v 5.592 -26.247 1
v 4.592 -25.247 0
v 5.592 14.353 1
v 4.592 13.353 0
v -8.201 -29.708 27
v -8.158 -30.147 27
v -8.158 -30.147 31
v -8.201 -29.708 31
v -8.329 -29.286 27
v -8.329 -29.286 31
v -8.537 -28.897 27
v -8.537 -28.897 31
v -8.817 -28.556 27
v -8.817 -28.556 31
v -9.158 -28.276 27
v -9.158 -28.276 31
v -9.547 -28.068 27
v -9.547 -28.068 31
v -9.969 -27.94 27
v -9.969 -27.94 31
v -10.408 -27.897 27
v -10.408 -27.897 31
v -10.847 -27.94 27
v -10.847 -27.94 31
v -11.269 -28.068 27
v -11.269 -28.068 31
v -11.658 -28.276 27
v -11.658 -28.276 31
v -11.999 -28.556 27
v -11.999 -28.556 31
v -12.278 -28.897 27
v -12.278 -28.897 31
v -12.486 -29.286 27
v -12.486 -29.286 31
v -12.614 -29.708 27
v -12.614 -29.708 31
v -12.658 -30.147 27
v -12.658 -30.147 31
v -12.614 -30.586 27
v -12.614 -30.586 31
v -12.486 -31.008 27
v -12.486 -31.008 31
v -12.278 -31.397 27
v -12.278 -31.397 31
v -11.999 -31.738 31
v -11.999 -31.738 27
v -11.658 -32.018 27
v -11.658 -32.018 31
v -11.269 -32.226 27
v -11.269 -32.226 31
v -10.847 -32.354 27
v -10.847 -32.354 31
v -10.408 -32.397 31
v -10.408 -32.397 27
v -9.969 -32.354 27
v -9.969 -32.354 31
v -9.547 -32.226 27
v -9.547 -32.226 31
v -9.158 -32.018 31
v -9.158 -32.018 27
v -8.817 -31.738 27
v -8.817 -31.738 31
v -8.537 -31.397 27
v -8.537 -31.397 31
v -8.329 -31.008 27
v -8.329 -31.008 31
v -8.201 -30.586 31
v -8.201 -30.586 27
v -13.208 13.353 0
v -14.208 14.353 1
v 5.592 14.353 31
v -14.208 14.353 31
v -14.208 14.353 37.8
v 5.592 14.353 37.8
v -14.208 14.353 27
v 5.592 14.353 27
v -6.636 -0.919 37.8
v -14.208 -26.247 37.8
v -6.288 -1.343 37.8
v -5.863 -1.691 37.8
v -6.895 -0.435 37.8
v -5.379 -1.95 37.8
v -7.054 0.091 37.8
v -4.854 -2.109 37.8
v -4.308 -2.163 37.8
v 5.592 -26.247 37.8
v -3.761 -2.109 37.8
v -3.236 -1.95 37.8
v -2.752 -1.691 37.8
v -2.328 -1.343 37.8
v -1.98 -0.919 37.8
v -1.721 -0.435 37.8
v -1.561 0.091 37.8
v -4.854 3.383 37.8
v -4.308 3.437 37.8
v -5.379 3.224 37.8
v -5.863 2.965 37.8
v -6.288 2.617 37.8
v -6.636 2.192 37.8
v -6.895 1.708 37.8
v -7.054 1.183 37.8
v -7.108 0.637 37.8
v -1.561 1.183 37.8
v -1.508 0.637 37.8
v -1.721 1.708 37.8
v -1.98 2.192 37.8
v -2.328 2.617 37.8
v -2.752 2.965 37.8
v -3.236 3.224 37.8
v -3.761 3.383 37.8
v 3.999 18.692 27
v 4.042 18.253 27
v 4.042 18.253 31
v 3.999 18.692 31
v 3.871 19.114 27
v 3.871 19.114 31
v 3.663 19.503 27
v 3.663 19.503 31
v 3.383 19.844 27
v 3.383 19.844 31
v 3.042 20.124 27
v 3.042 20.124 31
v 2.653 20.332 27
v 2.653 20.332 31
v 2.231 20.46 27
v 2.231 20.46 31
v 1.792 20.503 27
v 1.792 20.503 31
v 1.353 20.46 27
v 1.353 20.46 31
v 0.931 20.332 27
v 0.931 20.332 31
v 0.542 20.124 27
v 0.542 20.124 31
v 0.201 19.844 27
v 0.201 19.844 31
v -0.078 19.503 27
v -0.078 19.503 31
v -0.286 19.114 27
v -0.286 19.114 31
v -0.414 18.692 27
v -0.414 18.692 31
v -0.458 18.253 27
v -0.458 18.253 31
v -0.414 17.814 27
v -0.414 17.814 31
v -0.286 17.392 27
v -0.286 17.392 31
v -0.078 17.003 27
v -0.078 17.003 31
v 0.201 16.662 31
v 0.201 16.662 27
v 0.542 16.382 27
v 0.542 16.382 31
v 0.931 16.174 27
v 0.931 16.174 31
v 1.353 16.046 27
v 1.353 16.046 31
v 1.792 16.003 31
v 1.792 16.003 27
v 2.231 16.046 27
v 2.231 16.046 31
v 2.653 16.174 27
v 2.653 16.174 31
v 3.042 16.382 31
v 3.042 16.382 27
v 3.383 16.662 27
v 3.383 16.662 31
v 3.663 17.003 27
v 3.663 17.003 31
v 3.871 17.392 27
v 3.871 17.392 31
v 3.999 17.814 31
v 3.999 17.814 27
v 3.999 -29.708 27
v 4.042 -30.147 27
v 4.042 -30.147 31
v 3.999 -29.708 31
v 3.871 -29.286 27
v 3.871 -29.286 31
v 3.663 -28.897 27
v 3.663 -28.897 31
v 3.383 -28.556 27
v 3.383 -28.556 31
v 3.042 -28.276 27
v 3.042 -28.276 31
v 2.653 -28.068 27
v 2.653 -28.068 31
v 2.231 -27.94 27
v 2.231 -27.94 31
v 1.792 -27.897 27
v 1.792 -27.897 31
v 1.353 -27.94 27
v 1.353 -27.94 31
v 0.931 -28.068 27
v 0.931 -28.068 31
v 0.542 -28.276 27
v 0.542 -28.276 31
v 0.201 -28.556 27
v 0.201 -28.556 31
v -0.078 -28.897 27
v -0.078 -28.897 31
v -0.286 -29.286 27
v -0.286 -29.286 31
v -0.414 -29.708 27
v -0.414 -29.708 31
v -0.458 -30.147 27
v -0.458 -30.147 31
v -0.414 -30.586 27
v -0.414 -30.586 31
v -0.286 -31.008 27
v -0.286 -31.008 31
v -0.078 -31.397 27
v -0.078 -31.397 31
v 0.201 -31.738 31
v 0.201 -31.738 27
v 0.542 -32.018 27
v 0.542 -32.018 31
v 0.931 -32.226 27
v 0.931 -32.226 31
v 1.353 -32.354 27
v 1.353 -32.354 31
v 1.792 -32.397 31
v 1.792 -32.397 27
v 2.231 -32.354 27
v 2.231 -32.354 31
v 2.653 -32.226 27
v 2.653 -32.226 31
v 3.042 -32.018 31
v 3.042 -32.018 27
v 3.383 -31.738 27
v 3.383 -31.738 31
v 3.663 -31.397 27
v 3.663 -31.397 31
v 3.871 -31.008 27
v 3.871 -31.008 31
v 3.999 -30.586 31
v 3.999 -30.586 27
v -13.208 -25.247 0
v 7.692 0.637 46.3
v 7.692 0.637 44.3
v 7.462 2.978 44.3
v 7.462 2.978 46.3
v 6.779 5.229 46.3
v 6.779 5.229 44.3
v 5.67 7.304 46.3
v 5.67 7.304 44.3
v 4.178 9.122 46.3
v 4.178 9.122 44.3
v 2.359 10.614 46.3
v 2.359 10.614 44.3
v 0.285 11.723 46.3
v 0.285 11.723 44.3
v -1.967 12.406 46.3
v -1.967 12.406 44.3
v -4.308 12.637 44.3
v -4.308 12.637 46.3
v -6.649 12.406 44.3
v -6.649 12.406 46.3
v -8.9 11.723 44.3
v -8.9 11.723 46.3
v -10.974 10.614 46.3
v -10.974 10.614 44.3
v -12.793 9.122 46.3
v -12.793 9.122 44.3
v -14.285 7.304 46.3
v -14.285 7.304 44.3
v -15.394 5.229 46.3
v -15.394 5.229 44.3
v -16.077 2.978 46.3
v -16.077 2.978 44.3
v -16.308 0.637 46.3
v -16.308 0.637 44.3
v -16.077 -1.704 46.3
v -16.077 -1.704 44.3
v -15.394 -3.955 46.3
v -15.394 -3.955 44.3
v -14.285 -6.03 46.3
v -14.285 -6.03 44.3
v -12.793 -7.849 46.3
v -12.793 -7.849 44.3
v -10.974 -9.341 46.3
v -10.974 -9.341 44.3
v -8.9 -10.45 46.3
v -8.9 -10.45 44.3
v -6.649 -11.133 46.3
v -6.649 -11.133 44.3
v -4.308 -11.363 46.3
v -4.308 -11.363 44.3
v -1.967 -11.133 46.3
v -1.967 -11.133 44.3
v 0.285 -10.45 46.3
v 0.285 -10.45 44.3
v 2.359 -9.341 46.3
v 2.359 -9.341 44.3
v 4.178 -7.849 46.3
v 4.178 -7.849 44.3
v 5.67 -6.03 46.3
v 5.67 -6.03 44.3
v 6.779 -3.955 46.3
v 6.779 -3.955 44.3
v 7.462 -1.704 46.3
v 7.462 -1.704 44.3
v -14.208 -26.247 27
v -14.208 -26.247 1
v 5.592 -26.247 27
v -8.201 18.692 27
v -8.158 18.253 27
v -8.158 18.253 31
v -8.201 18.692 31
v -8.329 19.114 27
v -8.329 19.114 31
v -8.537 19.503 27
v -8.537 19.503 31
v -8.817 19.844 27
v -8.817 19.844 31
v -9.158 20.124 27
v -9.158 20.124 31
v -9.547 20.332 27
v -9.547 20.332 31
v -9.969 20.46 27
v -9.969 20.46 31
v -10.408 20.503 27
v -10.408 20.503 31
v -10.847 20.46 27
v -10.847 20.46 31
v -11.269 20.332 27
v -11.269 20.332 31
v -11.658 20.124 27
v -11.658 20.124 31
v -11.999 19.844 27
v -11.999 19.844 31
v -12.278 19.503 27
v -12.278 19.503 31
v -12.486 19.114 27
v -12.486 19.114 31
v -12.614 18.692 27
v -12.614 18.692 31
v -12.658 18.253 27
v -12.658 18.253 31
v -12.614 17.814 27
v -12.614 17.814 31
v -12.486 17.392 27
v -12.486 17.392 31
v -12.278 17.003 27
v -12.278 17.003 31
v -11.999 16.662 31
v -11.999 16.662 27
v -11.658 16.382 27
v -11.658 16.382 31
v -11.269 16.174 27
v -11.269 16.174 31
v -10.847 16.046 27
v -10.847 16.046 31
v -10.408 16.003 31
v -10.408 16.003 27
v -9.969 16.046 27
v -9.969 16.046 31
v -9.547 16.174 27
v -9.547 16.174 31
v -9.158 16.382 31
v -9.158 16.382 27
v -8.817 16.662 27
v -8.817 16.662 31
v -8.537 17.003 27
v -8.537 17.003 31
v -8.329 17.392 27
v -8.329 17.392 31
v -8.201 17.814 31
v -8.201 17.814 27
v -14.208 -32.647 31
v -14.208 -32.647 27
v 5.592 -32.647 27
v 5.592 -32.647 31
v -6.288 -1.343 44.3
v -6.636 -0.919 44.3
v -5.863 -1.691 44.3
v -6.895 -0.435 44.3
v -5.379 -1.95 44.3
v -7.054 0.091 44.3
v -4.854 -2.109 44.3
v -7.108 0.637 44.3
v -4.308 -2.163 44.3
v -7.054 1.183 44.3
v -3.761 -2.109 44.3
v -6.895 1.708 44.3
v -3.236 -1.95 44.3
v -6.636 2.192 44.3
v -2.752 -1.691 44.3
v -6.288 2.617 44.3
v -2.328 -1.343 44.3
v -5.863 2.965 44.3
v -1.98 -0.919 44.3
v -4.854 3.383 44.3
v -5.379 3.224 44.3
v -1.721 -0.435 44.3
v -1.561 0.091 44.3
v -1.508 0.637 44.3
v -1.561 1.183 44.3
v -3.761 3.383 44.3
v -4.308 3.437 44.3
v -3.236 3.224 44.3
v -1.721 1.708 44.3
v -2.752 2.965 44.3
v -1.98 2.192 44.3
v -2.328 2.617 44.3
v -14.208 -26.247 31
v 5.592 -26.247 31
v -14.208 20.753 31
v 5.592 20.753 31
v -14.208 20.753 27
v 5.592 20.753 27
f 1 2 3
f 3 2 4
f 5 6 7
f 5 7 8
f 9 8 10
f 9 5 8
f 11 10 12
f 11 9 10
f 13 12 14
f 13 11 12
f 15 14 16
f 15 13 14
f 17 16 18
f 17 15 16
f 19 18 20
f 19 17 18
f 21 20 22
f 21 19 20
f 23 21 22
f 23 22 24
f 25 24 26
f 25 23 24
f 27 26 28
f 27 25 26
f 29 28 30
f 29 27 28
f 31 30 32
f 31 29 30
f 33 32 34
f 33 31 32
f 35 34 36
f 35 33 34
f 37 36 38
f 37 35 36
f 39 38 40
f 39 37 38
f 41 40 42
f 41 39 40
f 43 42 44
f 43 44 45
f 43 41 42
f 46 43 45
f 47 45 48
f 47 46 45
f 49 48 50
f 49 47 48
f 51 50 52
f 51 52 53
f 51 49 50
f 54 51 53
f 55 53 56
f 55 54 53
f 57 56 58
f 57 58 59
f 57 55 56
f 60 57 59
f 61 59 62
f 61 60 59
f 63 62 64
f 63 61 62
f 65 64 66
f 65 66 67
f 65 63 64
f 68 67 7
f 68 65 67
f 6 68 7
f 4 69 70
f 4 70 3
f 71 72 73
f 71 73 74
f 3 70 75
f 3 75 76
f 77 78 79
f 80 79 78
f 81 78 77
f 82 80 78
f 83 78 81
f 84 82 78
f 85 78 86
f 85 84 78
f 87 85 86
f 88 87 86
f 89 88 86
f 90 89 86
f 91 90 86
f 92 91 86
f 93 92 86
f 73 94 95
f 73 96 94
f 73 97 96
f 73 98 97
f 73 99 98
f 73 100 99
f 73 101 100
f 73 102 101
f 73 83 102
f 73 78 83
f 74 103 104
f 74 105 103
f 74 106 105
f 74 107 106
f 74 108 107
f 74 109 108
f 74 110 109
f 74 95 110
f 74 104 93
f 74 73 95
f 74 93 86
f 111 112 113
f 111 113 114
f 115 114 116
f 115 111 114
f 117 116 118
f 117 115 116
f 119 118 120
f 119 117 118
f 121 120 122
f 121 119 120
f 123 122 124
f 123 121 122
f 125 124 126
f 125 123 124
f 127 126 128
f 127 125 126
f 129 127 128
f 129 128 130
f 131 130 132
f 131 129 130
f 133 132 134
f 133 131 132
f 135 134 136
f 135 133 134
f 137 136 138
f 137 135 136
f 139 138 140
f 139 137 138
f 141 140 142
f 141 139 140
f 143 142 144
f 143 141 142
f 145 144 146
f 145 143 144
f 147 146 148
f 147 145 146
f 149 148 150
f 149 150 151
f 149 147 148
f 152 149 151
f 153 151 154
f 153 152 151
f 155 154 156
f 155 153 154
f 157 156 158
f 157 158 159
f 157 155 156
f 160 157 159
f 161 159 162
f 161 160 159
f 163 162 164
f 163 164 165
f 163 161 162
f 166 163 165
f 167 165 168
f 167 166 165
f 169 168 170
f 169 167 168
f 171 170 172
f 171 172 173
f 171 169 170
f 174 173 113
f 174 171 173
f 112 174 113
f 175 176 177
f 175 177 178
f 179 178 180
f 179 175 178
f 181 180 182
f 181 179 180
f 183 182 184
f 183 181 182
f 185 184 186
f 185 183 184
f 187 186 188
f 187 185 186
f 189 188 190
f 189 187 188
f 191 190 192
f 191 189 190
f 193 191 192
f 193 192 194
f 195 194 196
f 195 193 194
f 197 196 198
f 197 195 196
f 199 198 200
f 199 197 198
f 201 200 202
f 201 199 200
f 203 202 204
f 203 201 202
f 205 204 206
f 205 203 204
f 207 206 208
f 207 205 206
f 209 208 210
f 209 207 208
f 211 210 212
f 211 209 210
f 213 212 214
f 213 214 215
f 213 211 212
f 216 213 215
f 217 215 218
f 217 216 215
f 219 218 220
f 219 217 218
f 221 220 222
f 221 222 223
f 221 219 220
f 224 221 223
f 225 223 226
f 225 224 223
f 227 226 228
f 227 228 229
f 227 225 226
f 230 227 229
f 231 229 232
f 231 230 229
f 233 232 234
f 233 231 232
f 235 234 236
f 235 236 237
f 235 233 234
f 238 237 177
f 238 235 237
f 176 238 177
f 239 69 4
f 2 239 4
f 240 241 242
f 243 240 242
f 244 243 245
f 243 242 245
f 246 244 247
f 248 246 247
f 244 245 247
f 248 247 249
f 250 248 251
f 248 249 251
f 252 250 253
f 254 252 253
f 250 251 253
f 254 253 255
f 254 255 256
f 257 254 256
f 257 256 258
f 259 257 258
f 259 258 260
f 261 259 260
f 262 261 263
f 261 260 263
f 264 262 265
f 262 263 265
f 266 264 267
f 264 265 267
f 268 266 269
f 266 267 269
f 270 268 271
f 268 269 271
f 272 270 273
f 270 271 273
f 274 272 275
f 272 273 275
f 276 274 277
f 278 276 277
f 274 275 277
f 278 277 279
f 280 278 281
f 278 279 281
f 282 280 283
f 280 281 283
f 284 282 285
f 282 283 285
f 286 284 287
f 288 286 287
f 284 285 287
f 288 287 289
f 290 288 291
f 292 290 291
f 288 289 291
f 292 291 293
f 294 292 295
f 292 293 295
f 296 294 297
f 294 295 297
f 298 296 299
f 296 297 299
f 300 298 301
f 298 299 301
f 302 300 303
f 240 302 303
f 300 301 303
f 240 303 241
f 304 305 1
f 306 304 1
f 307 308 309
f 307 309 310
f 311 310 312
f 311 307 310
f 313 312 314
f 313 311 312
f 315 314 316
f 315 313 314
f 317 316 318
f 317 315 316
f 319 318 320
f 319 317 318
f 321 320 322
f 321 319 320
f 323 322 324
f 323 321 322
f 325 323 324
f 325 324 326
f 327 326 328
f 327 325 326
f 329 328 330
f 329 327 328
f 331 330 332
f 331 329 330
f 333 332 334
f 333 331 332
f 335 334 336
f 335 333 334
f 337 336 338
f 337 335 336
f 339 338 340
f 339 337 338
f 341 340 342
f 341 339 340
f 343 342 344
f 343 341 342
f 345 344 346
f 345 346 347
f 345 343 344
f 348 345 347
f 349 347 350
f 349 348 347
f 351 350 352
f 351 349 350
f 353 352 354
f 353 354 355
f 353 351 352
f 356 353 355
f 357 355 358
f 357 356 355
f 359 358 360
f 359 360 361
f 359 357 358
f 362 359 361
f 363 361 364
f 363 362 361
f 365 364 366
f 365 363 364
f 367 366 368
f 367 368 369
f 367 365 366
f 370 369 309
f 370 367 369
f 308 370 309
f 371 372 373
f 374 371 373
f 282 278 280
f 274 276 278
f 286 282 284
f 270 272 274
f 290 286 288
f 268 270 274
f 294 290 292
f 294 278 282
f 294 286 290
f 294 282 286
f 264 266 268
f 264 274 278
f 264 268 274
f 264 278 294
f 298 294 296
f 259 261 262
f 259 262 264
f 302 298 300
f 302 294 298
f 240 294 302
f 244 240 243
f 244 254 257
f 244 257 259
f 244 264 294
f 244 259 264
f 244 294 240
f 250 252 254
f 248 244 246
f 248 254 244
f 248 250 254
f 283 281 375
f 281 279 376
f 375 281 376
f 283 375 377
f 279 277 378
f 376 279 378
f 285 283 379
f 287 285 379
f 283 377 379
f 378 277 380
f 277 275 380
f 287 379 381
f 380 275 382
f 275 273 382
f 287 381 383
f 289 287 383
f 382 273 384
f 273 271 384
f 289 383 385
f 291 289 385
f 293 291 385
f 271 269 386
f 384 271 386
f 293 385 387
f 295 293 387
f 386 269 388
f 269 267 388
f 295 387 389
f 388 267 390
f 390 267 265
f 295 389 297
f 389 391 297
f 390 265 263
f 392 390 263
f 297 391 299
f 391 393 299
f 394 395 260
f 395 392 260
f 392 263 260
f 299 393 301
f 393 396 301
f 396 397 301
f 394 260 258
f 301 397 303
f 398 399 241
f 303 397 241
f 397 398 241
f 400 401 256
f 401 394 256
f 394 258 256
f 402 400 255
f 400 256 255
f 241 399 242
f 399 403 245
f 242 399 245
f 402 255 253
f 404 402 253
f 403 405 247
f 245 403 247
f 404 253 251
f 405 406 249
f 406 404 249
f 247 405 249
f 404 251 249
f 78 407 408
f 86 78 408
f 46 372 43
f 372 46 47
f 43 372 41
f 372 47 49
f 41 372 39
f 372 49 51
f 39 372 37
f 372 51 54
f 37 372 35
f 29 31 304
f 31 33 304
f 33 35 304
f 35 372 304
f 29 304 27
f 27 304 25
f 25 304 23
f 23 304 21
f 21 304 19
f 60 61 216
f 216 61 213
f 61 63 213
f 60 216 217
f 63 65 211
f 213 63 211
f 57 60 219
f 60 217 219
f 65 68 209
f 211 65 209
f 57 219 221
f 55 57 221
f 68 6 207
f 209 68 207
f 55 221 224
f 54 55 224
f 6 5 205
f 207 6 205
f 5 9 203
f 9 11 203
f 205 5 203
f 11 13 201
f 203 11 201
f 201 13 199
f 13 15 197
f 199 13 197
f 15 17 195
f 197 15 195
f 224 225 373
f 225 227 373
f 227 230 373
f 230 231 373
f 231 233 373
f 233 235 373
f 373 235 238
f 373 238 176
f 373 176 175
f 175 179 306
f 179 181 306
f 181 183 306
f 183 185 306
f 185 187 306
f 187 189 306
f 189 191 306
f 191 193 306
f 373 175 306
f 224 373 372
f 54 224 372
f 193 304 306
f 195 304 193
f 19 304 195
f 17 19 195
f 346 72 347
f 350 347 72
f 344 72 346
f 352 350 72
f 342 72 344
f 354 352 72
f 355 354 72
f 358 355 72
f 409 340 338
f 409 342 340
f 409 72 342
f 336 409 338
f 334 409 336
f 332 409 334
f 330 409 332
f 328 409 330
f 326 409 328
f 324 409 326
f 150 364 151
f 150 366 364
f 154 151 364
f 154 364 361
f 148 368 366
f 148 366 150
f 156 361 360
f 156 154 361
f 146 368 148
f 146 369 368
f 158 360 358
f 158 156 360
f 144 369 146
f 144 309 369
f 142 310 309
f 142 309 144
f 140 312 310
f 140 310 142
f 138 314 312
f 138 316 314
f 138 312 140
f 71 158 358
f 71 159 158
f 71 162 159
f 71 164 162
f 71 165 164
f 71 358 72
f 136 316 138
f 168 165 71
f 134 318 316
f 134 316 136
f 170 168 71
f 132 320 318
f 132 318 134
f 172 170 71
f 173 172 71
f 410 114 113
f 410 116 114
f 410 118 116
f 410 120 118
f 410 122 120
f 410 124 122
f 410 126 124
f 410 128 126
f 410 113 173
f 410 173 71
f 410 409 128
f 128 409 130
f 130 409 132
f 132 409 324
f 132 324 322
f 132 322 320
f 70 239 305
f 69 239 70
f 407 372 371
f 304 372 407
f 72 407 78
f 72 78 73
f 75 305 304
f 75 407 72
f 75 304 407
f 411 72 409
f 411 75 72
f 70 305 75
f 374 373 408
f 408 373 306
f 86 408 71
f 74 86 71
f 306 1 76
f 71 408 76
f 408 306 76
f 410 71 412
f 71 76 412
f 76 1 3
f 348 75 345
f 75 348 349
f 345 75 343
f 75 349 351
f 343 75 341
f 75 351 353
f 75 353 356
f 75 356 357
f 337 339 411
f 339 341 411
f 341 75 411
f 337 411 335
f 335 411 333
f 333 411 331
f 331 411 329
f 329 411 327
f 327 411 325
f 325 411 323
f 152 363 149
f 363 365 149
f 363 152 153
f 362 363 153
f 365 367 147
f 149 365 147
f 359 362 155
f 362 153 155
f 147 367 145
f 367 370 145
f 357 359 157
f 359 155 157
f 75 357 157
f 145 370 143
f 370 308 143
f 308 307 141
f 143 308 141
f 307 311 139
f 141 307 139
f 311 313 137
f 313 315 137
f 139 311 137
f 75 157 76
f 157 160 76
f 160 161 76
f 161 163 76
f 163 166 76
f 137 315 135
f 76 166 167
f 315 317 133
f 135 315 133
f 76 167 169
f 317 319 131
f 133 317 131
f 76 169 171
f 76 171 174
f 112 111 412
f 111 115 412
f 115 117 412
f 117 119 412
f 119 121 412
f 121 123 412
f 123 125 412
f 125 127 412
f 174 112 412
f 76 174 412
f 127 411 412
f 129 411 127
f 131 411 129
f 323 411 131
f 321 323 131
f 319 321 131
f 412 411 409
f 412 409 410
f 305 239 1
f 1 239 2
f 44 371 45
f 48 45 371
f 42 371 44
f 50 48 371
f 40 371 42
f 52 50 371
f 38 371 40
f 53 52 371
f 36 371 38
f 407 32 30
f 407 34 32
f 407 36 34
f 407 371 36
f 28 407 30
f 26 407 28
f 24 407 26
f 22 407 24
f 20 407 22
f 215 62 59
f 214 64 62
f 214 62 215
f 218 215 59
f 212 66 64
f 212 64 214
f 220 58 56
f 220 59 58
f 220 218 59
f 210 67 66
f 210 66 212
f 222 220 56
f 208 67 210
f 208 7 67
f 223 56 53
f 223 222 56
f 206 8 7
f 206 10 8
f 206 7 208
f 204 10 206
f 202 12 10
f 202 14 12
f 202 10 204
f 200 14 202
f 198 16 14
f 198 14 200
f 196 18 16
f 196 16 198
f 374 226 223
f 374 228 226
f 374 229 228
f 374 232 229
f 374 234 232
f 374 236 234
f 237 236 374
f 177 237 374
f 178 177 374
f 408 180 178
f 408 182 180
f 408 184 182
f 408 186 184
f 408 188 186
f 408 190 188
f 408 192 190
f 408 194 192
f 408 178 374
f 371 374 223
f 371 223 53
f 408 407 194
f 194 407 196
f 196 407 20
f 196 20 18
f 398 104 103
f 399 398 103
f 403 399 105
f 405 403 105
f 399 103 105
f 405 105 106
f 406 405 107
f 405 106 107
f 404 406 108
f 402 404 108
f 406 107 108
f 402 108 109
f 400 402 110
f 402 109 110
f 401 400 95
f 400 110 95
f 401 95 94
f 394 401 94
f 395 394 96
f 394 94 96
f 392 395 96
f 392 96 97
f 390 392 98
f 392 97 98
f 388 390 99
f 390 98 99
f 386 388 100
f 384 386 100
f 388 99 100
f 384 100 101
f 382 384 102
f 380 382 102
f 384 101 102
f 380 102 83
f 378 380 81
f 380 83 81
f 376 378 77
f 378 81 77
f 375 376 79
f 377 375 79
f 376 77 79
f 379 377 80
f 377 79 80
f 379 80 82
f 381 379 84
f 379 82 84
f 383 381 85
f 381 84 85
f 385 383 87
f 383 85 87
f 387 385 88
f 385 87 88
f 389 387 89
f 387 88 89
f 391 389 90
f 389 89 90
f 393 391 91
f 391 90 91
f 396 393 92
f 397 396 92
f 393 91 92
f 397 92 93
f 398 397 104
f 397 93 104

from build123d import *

# Parameters (mm, degrees)
F0_W      = 19.8
F0_H      = 40.6
F1_DEPTH  = 27
F2_W      = 19.8
F2_H      = 6.4
F2_R      = 2.25
F3_DEPTH  = 4
F1_FACE_W = 19.8
F1_FACE_H = 40.6
F4_DEPTH  = 10.8
F5_SIZE   = 1
F6_R      = 2.8
F7_DEPTH  = 6.5
F8_R      = 12
F8_R_2    = 2.8
F9_DEPTH  = 2


with BuildPart() as f1:
    # F0 (on Top) → F1 (new body)
    with BuildSketch(Plane.XY):
        with Locations((-4.307641, -5.947228)):
            Rectangle(F0_W, F0_H)
    extrude(amount=F1_DEPTH)

    # F2 (on face) → F3 (join)
    with BuildSketch(Plane.XY.offset(27)):
        with Locations((-4.307641, 17.552772)):
            Rectangle(F2_W, F2_H)
        with Locations((-10.407641, 18.252772)):
            Circle(F2_R, mode=Mode.SUBTRACT)
        with Locations((1.792359, 18.252772)):
            Circle(F2_R, mode=Mode.SUBTRACT)
        with Locations((-4.307641, -29.447228)):
            Rectangle(F2_W, F2_H)
        with Locations((-10.407641, -30.147228)):
            Circle(F2_R, mode=Mode.SUBTRACT)
        with Locations((1.792359, -30.147228)):
            Circle(F2_R, mode=Mode.SUBTRACT)
    extrude(amount=F3_DEPTH)

    # F1_face (on face) → F4 (join)
    with BuildSketch(Plane(origin=(-4.307641, -5.947228, 27), x_dir=(1, 0, 0), z_dir=(0, 0, 1))):
        Rectangle(F1_FACE_W, F1_FACE_H)
    extrude(amount=F4_DEPTH)

    # F5
    f5_edges = [f1.edges().sort_by_distance(p)[0] for p in [
        (-14.207641, -5.947228, 0),
        (-4.307641, 14.352772, 0),
        (5.592359, -5.947228, 0),
        (-4.307641, -26.247228, 0),
    ]]
    chamfer(f5_edges, length=F5_SIZE)

    # F6 (on face) → F7 (join)
    with BuildSketch(Plane.XY.offset(37.8)):
        with Locations((-4.307641, 0.636772)):
            Circle(F6_R)
    extrude(amount=F7_DEPTH)

    # F8 (on face) → F9 (join)
    with BuildSketch(Plane.XY.offset(44.3)):
        with Locations((-4.307641, 0.636772)):
            Circle(F8_R)
        with Locations((-4.307641, 0.636772)):
            Circle(F8_R_2, mode=Mode.SUBTRACT)
        with Locations((-4.307641, 0.636772)):
            Circle(F8_R_2)
    extrude(amount=F9_DEPTH)


solid = f1.part
